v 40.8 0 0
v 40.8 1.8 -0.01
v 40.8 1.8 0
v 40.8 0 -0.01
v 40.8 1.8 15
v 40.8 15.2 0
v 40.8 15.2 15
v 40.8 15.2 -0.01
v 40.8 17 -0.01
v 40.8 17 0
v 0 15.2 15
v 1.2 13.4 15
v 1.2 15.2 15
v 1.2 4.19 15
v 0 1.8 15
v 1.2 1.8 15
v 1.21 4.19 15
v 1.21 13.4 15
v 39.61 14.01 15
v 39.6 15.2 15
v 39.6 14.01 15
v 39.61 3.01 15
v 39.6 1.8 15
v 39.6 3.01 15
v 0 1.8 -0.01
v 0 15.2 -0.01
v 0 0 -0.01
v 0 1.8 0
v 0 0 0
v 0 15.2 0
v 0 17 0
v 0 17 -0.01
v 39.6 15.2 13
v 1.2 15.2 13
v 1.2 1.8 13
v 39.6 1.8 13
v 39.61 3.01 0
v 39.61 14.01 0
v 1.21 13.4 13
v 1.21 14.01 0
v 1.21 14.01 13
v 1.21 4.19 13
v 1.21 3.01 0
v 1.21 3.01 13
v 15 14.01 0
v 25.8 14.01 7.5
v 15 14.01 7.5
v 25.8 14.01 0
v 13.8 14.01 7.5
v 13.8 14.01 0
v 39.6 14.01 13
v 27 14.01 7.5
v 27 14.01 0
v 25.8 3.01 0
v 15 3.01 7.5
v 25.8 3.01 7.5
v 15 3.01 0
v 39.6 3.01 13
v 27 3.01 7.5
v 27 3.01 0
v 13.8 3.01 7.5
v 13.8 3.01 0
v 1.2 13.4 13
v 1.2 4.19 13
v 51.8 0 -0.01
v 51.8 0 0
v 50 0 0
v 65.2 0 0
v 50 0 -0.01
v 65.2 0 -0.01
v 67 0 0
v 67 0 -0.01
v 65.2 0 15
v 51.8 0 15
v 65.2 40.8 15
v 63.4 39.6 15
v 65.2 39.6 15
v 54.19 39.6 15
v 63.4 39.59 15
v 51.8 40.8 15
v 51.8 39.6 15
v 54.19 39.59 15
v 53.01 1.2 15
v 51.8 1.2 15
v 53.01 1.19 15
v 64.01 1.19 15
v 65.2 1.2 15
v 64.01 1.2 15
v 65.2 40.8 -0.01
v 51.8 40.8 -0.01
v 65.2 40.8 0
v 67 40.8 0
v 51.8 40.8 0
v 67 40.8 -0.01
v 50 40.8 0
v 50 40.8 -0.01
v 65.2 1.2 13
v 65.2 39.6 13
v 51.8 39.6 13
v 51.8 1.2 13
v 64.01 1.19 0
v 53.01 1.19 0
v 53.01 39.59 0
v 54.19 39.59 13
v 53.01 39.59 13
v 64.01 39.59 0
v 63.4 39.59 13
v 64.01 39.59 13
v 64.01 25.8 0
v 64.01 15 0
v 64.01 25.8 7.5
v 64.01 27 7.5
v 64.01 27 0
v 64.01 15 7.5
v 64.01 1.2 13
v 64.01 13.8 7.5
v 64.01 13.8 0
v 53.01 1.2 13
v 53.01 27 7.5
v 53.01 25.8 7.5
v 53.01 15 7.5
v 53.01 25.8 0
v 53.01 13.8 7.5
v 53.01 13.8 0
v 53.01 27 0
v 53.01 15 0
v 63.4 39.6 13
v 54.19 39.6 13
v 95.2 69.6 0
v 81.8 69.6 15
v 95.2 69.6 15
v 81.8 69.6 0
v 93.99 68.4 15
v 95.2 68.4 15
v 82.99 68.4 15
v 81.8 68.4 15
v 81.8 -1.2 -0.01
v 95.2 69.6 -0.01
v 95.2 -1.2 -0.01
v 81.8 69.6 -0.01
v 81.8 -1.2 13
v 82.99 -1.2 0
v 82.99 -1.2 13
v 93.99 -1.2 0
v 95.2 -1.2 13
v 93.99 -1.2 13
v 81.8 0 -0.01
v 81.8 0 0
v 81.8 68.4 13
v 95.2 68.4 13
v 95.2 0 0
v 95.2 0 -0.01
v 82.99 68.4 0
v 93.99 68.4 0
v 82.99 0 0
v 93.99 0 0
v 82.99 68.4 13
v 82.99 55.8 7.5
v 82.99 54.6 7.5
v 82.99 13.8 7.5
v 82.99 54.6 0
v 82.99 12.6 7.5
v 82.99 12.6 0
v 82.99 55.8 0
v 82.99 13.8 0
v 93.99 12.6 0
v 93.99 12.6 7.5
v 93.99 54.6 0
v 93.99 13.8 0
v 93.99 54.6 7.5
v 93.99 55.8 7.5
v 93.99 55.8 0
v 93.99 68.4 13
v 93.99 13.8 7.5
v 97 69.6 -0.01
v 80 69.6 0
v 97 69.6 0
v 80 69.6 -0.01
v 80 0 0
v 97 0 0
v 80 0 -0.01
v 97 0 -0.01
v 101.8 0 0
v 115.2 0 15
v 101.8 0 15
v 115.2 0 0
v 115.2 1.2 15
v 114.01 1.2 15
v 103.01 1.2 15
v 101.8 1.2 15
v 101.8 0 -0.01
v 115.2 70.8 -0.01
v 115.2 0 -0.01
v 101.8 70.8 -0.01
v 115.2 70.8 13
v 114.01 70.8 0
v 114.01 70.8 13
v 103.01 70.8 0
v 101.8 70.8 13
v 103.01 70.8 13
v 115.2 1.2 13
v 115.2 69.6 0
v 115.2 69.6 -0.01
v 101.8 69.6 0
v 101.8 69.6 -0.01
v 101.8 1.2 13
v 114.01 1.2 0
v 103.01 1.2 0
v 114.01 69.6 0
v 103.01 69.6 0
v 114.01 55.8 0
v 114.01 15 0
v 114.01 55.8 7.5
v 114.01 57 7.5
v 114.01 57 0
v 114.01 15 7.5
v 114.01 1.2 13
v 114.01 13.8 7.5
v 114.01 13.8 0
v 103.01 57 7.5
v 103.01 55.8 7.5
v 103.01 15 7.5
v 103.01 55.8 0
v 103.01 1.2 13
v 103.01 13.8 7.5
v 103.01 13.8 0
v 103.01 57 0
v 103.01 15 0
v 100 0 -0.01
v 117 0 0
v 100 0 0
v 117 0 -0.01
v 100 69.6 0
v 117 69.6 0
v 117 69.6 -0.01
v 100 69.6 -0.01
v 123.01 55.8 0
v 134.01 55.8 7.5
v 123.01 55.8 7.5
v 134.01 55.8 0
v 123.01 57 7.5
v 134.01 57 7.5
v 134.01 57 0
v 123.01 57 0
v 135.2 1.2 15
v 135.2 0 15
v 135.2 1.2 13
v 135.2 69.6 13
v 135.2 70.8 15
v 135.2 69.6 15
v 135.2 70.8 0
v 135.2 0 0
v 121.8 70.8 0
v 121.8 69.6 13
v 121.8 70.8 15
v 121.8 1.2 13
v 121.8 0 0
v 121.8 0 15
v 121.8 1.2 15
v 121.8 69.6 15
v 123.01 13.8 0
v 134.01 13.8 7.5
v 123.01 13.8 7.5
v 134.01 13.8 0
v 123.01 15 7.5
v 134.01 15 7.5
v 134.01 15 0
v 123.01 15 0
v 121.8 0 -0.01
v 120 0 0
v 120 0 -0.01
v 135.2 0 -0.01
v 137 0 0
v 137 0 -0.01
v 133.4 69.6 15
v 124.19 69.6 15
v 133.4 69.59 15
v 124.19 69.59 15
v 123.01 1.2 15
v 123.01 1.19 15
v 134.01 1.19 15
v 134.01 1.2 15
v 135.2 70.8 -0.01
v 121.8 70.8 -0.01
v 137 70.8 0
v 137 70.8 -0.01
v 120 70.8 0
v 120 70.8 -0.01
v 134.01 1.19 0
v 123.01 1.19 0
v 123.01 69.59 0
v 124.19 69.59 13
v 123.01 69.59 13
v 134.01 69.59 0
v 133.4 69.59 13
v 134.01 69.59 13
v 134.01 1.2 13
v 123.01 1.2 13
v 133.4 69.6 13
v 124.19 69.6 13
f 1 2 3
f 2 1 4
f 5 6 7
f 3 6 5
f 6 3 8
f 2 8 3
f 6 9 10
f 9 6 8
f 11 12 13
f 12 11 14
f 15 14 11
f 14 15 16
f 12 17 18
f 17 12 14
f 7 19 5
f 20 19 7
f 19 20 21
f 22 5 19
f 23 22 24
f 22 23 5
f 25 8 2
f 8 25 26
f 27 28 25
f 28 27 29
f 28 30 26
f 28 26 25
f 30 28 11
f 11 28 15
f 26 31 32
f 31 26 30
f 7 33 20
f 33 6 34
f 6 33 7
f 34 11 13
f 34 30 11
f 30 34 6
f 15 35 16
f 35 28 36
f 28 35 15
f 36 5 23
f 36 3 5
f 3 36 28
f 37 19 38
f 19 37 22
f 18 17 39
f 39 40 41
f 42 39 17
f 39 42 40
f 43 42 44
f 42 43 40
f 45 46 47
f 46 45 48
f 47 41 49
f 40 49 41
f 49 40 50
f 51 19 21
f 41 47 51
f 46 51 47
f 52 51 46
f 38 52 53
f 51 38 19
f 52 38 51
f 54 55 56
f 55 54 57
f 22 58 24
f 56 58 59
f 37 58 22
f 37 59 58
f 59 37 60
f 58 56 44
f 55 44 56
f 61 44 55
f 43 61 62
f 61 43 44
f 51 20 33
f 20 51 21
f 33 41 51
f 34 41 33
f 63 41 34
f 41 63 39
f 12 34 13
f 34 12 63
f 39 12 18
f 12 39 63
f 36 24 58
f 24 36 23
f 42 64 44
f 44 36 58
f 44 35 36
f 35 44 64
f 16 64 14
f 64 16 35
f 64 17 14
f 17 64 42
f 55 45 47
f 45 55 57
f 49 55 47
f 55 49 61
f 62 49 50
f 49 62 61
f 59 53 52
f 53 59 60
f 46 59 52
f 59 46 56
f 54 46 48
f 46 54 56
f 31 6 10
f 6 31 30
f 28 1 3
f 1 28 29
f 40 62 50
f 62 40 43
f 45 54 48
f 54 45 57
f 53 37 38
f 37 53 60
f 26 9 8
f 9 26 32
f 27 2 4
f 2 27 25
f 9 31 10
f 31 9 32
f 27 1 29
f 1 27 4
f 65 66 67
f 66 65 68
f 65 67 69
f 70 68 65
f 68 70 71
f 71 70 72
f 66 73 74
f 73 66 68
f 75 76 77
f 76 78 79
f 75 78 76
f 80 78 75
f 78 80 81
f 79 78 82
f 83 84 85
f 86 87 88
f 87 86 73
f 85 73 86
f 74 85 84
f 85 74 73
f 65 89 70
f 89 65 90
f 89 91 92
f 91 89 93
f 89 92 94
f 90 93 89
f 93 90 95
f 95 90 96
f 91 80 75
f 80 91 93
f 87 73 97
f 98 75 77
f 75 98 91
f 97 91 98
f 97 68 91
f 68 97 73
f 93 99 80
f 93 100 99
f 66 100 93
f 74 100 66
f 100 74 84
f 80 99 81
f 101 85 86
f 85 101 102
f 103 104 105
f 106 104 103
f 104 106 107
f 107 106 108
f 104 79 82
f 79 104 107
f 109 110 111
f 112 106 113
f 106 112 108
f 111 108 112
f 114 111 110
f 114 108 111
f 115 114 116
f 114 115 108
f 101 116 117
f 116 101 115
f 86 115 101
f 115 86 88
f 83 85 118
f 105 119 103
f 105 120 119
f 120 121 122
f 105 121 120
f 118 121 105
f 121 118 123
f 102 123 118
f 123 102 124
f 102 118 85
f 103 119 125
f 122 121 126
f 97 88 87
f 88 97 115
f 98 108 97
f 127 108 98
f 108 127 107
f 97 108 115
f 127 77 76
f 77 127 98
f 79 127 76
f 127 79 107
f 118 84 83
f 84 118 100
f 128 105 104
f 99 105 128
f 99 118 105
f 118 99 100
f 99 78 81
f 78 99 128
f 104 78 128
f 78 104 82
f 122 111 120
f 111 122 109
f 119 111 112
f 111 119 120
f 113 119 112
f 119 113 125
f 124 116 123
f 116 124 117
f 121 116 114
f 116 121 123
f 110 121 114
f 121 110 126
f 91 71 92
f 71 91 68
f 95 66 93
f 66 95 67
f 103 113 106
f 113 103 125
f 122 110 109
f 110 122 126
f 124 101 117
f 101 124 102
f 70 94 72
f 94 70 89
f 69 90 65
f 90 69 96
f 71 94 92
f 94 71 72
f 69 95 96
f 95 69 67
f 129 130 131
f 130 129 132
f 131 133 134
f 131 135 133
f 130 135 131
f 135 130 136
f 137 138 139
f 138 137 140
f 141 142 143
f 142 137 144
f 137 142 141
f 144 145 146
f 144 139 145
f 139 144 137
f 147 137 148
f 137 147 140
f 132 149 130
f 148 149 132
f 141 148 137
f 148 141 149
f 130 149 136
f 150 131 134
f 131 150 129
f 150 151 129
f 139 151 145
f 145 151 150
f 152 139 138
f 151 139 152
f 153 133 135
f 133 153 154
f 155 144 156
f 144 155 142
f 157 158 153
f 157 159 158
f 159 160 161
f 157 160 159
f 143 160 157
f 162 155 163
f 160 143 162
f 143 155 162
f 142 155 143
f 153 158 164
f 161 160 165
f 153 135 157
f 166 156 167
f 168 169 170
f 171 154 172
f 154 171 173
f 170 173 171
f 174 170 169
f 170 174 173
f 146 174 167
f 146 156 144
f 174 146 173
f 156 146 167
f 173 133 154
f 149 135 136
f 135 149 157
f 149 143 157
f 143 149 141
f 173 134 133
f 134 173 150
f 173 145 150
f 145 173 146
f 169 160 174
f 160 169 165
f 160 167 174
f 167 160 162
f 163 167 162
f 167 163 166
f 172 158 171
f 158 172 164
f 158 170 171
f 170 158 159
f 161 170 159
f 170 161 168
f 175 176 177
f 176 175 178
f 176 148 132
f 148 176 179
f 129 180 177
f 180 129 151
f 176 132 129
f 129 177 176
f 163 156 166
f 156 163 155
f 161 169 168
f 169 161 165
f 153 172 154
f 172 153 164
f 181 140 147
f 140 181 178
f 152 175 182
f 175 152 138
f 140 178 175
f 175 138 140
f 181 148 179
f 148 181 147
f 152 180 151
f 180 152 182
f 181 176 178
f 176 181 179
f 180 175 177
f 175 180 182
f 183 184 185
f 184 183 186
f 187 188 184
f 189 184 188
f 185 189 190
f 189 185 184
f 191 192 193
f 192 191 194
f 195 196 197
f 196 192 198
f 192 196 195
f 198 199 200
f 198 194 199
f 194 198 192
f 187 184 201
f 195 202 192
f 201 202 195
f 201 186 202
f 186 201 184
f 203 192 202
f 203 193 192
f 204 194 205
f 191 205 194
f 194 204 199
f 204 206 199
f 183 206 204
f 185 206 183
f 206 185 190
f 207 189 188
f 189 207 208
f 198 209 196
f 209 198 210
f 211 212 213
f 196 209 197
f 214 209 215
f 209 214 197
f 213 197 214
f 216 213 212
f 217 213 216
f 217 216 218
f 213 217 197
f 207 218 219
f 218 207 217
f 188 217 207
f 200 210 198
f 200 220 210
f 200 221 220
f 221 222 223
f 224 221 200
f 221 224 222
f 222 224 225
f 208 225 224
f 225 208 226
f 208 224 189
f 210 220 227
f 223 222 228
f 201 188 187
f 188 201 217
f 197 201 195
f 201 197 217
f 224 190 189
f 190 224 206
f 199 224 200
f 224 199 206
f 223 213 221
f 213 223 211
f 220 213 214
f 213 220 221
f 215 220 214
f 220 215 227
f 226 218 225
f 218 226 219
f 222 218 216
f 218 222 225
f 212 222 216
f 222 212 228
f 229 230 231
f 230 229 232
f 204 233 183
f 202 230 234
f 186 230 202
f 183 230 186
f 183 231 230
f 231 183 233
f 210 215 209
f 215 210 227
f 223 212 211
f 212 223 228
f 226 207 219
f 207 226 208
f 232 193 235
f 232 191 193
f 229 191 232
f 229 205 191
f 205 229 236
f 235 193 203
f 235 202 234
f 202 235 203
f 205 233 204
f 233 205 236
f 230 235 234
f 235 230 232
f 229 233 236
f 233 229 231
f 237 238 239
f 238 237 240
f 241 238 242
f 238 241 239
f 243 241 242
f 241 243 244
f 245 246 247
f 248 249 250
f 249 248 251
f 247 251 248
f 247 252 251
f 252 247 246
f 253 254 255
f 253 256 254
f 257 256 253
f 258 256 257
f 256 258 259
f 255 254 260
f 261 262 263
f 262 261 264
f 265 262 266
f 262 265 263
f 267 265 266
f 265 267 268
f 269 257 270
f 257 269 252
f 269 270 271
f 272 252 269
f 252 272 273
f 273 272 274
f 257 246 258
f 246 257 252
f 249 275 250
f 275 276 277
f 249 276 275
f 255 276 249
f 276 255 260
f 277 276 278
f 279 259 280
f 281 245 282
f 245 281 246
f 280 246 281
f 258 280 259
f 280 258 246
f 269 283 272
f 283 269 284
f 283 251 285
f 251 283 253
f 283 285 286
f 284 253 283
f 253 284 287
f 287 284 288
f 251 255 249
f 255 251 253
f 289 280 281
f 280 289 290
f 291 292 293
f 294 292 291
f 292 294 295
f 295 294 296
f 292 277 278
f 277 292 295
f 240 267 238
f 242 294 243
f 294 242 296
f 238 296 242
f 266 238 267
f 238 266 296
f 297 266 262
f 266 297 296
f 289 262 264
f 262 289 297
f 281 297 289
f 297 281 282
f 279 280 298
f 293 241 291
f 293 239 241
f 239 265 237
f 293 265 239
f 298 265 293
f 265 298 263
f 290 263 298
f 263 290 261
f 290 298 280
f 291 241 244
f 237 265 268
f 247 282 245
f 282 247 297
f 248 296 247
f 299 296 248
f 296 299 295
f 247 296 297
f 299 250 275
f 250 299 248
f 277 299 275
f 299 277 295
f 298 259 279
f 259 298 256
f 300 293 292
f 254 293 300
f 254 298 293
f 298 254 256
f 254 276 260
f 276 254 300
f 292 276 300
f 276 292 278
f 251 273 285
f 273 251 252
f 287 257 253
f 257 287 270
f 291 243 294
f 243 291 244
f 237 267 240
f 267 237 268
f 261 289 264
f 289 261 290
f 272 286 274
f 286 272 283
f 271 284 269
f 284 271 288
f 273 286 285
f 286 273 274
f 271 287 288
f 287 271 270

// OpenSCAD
// file: ../../Base/Boxes.scad
// Fischertechnik Box Foundation
// Pre-designed Boxes

use <Constants.scad>

include <PlacementOptions.scad>

box190Width = 190;
box190Depth = 130;
box130Width = 130;
box130Depth = 95;

// Values are from an original ec3 box
topBottomDifference = 1.5;
outerHeight = 40;
baseThickness = 1.8;
innerHeight = outerHeight - baseThickness;
stackExcess = 5.7;
radius = 3.5;
wallThickness = 1.5;
tolerance = 0.2;

boxWallThickness = wallThickness;
boxBaseThickness = baseThickness;
boxWebWidth = 3.0;

// getBoxWallThickness()
// Gets the wall thickness of a Fischertechnik Box
function getBoxWallThickness() = boxWallThickness;

// getBoxUsageHeight(height = 38.2)
// Gets the usable height of a Fischertechnik box
// height = Outer height of the box from the bottom to the upper edge.
function getBoxUsageHeight(height = outerHeight) = height - baseThickness - stackExcess;

// getBoxInnerHeight()
// Gets the inner height of a Fischertechnik box, including the stack excess
function getBoxInnerHeight() = innerHeight;

// getBoxBaseThickness()
// Gets the thickness of the Fischertechnik box base.
function getBoxBaseThickness() = boxBaseThickness;

// getBoxWebWidth()
// Gets the width of a box web
function getBoxWebWidth() = boxWebWidth;

// getBox190Space()
// Gets the usable inner space of a Box 190 as an x/y-list
function getBox190Space() = [
    box190Width - 2*getBoxWallThickness() - topBottomDifference, 
    box190Depth - 2*getBoxWallThickness() - topBottomDifference ];

// RoundedCornerPlate(width, depth, height, radius)
// Creates a body plate with rounded corners for a box. Used
// also to create the complete box with the hull module.
// width = Width of the plate
// depth = depth of the plate 
// height = thickness of the plate
// radius = radius of the rounded corner
module RoundedCornerPlate(width, depth, height, radius) {
    translate([radius, radius])
    hull() {
        w = width-2*radius;
        d = depth-2*radius;
        cube([w, d, height]);
        cylinder(height, r=radius, $fn=getFragments());
        translate([w, 0])
            cylinder(height, r=radius, $fn=getFragments());
        translate([w, d])
            cylinder(height, r=radius, $fn=getFragments());
        translate([0, d])
            cylinder(height, r=radius, $fn=getFragments());
    }
}

// BoxBase(width, depth)
// Creates an empty stackable Fischertechnik compatible box
// width = Outer width of the box (190, 130, ...)
// depth = Outer depth of the box (130, 95, ...)

module BoxBase(width, depth, height=outerHeight) {    
    thinPlate = 0.01;

    innerHeight = height - baseThickness;    
    
    module Body(tolerance=tolerance) {
        hull() {
            // Bottom with tolerance to fit into the original boxes when stacked
            translate([-wallThickness+tolerance, -wallThickness+tolerance, -baseThickness])
                RoundedCornerPlate(width-topBottomDifference-2*tolerance, depth-topBottomDifference-2*tolerance, thinPlate, radius);
            
            // Top
            translate([-wallThickness-topBottomDifference/2, -wallThickness-topBottomDifference/2, innerHeight-thinPlate])
                RoundedCornerPlate(width, depth, thinPlate, radius);
         }
    }

    module Cutoff() {
        hull() {
            coWidth = width - 2*wallThickness;
            coDepth = depth - 2*wallThickness;
            
            // Bottom
            RoundedCornerPlate(coWidth-topBottomDifference, coDepth-topBottomDifference, thinPlate, radius);

            // Top
            translate([-topBottomDifference/2, -topBottomDifference/2, innerHeight+thinPlate]) 
                RoundedCornerPlate(coWidth, coDepth, thinPlate, radius);
        }
    }
    
    difference() {        
        Body();
        Cutoff();
        stackOffset = innerHeight - stackExcess;
        translate([0, 0, stackOffset + baseThickness])
            Body(tolerance=0);
    }
}

// Creates the Fischertechnik empty box 130x190 mm and places it at position 0,0
// 190x130 are the outer sizes, the inner space is slightly smaller. Use getBox190Space() to get the inner sizes.
// The box is positioned that the usable inner space is at the 0,0,0 position.

module Box190() {
    BoxBase(box190Width, box190Depth);
}

// Gets the usable inner space of a Box 130 as an x/y-list
function getBox130Space() = [
    box130Width - 2*getBoxWallThickness() - topBottomDifference, 
    box130Depth - 2*getBoxWallThickness() - topBottomDifference ];

// Creates the Fischertechnik empty box 95x130 mm and places it at position 0,0
// 190x130 are the outer sizes, the inner space is slightly smaller. Use getBox190Space() to get the inner sizes.
// The box is positioned that the usable inner space is at the 0,0,0 position.

module Box130() {
    BoxBase(box130Width, box130Depth);
}

// Creates a web at the specified box walls
// corner 0 = LowerLeft, 1 = UpperLeft, 2 = UpperRight, 3 = LowerRight
// side 0 = LeftOfCorner, 1 = RightOfCorner
// distance = Distance in mm from the corner
// boxSpace = inner width and depth of the box (default: Box 190)
// webWidth = length of the web (default is 3 mms)
// webThickness = thickness of the web (default is 1 mm)
// height = Height of the web (standard is getBoxUsageHeight())
// sink = How much of the web is sunk into the wall

module BoxWeb(
    corner, 
    side, 
    distance, 
    boxSpace=getBox190Space(), 
    webWidth=getBoxWebWidth(), 
    webThickness=1.0, 
    height=getBoxUsageHeight(),
    sink = getBoxWallThickness()/2) {
    width = (corner % 2 == 0) ? 
            (side == LeftOfCorner ? webWidth : webThickness) :
            (side == LeftOfCorner ? webThickness : webWidth);

    depth = (corner % 2 == 0) ? 
            (side == RightOfCorner ? webWidth : webThickness) :
            (side == RightOfCorner ? webThickness : webWidth);
    
    xDiff = corner == LowerLeft ? 
                (side == LeftOfCorner ? -sink : distance) :
            (corner == UpperLeft ?                
                (side == LeftOfCorner ? distance : -sink) :
            (corner == UpperRight ?
                (side == LeftOfCorner ? boxSpace.x-webWidth+sink : boxSpace.x-distance-webThickness) :
                (side == LeftOfCorner ? boxSpace.x-distance-webThickness: boxSpace.x-webWidth+sink)));

    yDiff = corner == LowerLeft ? 
                (side == RightOfCorner ? -sink : distance) :
            (corner == UpperLeft ?
                (side == RightOfCorner ? boxSpace.y-distance-webThickness : boxSpace.y-webWidth+sink) :
            (corner == UpperRight ?
                (side == RightOfCorner ? boxSpace.y-webWidth+sink : boxSpace.y-distance-webThickness) :
                (side == RightOfCorner ? distance : -sink)));
    
    translate([xDiff, yDiff, -getExcess()])
        cube([width, depth, height + 2*getExcess()]);
}
// file: ../../Base/Rotation.scad
// Fischertechnik Box Foundation
// Geometry Helpers Rotation

include <PlacementOptions.scad>

// getRotatedSpace(space, rotation=NoRotation)
// Rotates the space dependent on the specified rotation

function getRotatedSpace(space, rotation=NoRotation) = [
    (rotation == Rotate90 || rotation == Rotate270) ? space.y : space.x,
    (rotation == Rotate90 || rotation == Rotate270) ? space.x : space.y
];

// Rotates the given space around the fixed left lower corner
// space = the space the children needs as width/depth list [width,depth]
// rotation = 0 Rotate0 degrees, 1 Rotate90 degrees, 2 Rotate180 degrees, 3 Rotate270 degrees (equivalent to -90)

module RotateFix(space, rotation=NoRotation) {
    dy = (rotation == Rotate0 || rotation == Rotate270) ? 0 :
        (rotation == Rotate90) ? space.x :
        space.y;
    dx = (rotation < Rotate180) ? 0 :
        (rotation == Rotate180) ? space.x :
        space.y;
    
    translate([dx, dy, 0])
        rotate([0, 0, rotations[rotation]])
            children();
}
// file: ../../Base/Alignment.scad
// Fischertechnik Box Foundation
// Geometry Helpers Alignment

include <PlacementOptions.scad>

// getAlignedX(elementWidth, spaceWidth, align=AlignRight, offset=0)
// Gets the aligned X offset of an element with the given
// width in the given space.
// elementWidth = The width of the element to positon
// spaceWidth = The space where the element should be aligned
// align = 0 AlignLeft, 1 AlignCenter, 2 AlignRight
// offset = an optional offset from the aligned position. When
// aligned left or centered, then positive values are in X direction.
// When aligned right then positive values are in negative X direction.

function getAlignedX(elementWidth, spaceWidth, align=AlignRight, offset=0) =
    (align == AlignLeft) ?
        offset :
        ((align == AlignCenter) ?
        (spaceWidth - elementWidth)/2 + offset :
        spaceWidth - offset - elementWidth);

// getAlignedY(elementDepth, spaceDepth, align=AlignTop, offset=0)
// Gets the aligned Y offset of an element with the given
// depth in the given space.
// elementDepth = The depth of the element to positon
// spaceDepth = The space where the element should be aligned
// align = 0 AlignBottom, 1 AlignCenter, 2 AlignTop
// offset = an optional offset from the aligned position. When
// aligned bottom or centered, then positive values are in Y direction.
// When aligned top then positive values are in negative Y direction.

function getAlignedY(elementDepth, spaceDepth, align=AlignTop, offset=0) =
    (align == AlignBottom) ?
        offset :
        ((align == AlignCenter) ?
        (spaceDepth - elementDepth)/2 + offset :
        spaceDepth - offset - elementDepth);
// file: ../../Base/Constants.scad
// Fischertechnik Box Foundation
// Constants

// Constant values necessary for multiple elements

// Base constants
dividerThickness = 1.2;
excess = 0.01;
fragments = 90;
tolerance = 0.8;

// Gets the thickness of a divider 
function getDividerThickness() = dividerThickness;

// Gets the excess that is used to merge walls into each other
function getExcess() = excess;

// Gets amount of fragments of a cylinder
function getFragments() = fragments;

// Gets the inner tolerance of a frame to each side
function getTolerance() = tolerance;


// Fischertechnik specific constants
axisDiameter = 4;
axisBottomDiameter = axisDiameter + 1;
axisTolerance = 0.2;

// Gets axis diameter of Fischertechnik axis
function getAxisDiameter() = axisDiameter;

// Gets axis diameter tolerance (subtracted for element axis)
function getAxisTolerance() = axisTolerance;

// Gets the axis diameter for standing axis
function getStandAxisDiameter() = getAxisDiameter() - getAxisTolerance();

// Gets axis bottom diameter for thicker part at the bottom
function getAxisBottomDiameter() = axisBottomDiameter;

pinHeight = 2.5;
pinTolerance = 0.2;

// gets the height of a connecting pin
function getPinHeight() = pinHeight;

// gets the connecting pin height tolerance
function getPinTolerance() = pinTolerance;

standardEdgeDistance = 2.5;
standardWebDistance = 11.5;
standardCornerLength = 15;

// gets the standard distance to the wall of the box for dockable frames with webs
function getStandardEdgeDistance() = standardEdgeDistance;

// gets the standard distance of each web to the corner of the dockable frame
function getStandardWebDistance() = standardWebDistance;

// gets the standard length of the corner walls of a dockable frame
function getStandardCornerLength() = standardCornerLength;

tubeWallFactor = 0.8;

// gets the wall thickness of a tube.
function getTubeWallThickness() = tubeWallFactor * getDividerThickness();

smallPartsFrameHeight = 20;

// gets the frame height for docked small parts boxes.
function getSmallPartsFrameHeight() = smallPartsFrameHeight;

hubRingDiameter = 19.5;
hubRingLevelDiameter = 21;

// gets the diameter of a tube matching the inner ring of a wheel
function getHubRingDiameter() = hubRingDiameter;

// gets the diameter of a hub tube with a thicker diameter
function getHubRingLevelDiameter() = hubRingLevelDiameter;
// file: ../../Base/PlacementOptions.scad
// Fischertechnik Box Foundation
// Placement Options

// Alignment
NoAlign = 0;
AlignLeft = 1;
AlignBottom = 2;
AlignCenter = 3;
AlignRight = 4;
AlignTop = 5;

// Element rotation degree steps
rotations = [0, -90, -180, -270];

// Rotation
NoRotation = 0;
Rotate0 = 0;
Rotate90 = 1;
Rotate180 = 2;
Rotate270 = 3;

// Docking (seen from above)
NoDock = -1;
DockLeft = 0;
DockTop = 1;
DockRight = 2;
DockCorner = 2;
DockBottom = 3;

// Web corners
LowerLeft = 0;
UpperLeft = 1;
UpperRight = 2;
LowerRight = 3;

// Web position relative to corner
LeftOfCorner = 0;
RightOfCorner = 1;

// Rails direction
Horizontal = true;
Vertical = false;
// file: ../../Base/Placement.scad
// Fischertechnik Box Foundation
// Geometry Helpers Placement

use <Constants.scad>
use <Alignment.scad>
use <Rotation.scad>
use <Boxes.scad>

include <PlacementOptions.scad>

// Place(x=0, y=0, elementSpace=[0,0], alignX=AlignLeft, alignY=AlignBottom, rotation=Rotate0, boxSpace=getBox190Space())
// Places the child at the specified position
// y = Y-Position. This is a relative position when an X aligment is specified.
// x = X-Position. This is a relative position when an Y aligment is specified.
// elementSpace = space of the element to be placed [x,y]
// alignX = -1=NoAlign, 0 AlignLeft, 1 AlignCenter, 3 AlignRight (elementSpace and boxSpace required!)
// alignY = -1=NoAlign, 2 AlignBottom, 1 AlignCenter, 4 AlignTop (elementSpace and boxSpace required!)
// rotation = 0 Rotate0 0 degrees, 1 Rotate90 90 degrees, 
// 2 Rotate180 180 degrees, 3 Rotate270 270 degrees (equivalent to -90)
// boxSpace = Inner space of the box where the placement occurs [x,y] - default is Box 190x130 inner space

module Place(x=0, y=0, elementSpace=[0,0], 
  alignX=AlignLeft, alignY=AlignBottom, 
  rotation=NoRotation, boxSpace=getBox190Space()) {

    module Position(x, y, space, rotation=Rotate0) {
        translate([x, y, 0])
            RotateFix(space, rotation)
                children();
    }

    space = getRotatedSpace(elementSpace, rotation);
    alignedX = getAlignedX(space.x, boxSpace.x, alignX, x);
    alignedY = getAlignedY(space.y, boxSpace.y, alignY, y);
    Position(alignedX, alignedY, elementSpace, rotation)
        children();
}

// Center(space=getBox130Space(), elementSpace=[0,0])
// space = Space where the children is centered. For cylinder use centered=true and no elementSpace.
// elementSpace = space of the element to be centered [x,y]

module Center(space=getBox190Space(), elementSpace=[0,0]) {
    Place(elementSpace=elementSpace, boxSpace=space, alignX=AlignCenter, alignY=AlignCenter)
        children();
}

// CenterHorizontal(width=0, y=0, offset=0, space=getBox130Space())
// width = Width of the element to be placed.
// y = Y position of the element
// offset = Offset from the center position (negative will be left of the center)
// space = Space where the element is placed

module CenterHorizontal(width=0, y=0, offset=0, space=getBox190Space()) {
    Place(x=offset, y=y, elementSpace=[width, 0], boxSpace=space, alignX=AlignCenter)
        children(0);
}

// CenterVertical(depth=0, x=0, offset=0, space=getBox130Space())
// depth = Depth of the element to be placed.
// x = X position of the element
// offset = Offset from the center position (negative will be down of the center)
// space = Space where the element is placed

module CenterVertical(depth=0, x=0, offset=0, space=getBox190Space()) {
    Place(x=x, y=offset, elementSpace=[0, depth], boxSpace=space, alignY=AlignCenter)
        children(0);
}

// getIsVertical(align)
// True if the specified alignment needs a vertical orientation for a divider (AlignRight, AlignLeft)

function getIsVertical(align) = (align == AlignRight || align == AlignLeft);

// getIsHorizontal(align)
// True if the specified alignment needs a horizontal orientation for a divider (AlignTop, AlignBottom)

function getIsHorizontal(align) = (align == AlignTop || align == AlignBottom);
// main file
// Fischertechnik Box Foundation
// ModelBase Complex
// Test GearRack

use <../../Base/Placement.scad>
use <../../ModelBase/Complex.scad>

include <../../Base/PlacementOptions.scad>

GearRack();

Place(50, 0, getGearRackSpace(), rotation=Rotate90)
    GearRack();

Place(80, 0, getGearRackSpace(60, true), rotation=Rotate270)
    GearRack(60, true);

Place(100, 0, getGearRackSpace(60, true), rotation=Rotate90)
    GearRack(60, true);

Place(120, 0, getGearRackSpace(60), rotation=Rotate90)
    GearRack(60);
